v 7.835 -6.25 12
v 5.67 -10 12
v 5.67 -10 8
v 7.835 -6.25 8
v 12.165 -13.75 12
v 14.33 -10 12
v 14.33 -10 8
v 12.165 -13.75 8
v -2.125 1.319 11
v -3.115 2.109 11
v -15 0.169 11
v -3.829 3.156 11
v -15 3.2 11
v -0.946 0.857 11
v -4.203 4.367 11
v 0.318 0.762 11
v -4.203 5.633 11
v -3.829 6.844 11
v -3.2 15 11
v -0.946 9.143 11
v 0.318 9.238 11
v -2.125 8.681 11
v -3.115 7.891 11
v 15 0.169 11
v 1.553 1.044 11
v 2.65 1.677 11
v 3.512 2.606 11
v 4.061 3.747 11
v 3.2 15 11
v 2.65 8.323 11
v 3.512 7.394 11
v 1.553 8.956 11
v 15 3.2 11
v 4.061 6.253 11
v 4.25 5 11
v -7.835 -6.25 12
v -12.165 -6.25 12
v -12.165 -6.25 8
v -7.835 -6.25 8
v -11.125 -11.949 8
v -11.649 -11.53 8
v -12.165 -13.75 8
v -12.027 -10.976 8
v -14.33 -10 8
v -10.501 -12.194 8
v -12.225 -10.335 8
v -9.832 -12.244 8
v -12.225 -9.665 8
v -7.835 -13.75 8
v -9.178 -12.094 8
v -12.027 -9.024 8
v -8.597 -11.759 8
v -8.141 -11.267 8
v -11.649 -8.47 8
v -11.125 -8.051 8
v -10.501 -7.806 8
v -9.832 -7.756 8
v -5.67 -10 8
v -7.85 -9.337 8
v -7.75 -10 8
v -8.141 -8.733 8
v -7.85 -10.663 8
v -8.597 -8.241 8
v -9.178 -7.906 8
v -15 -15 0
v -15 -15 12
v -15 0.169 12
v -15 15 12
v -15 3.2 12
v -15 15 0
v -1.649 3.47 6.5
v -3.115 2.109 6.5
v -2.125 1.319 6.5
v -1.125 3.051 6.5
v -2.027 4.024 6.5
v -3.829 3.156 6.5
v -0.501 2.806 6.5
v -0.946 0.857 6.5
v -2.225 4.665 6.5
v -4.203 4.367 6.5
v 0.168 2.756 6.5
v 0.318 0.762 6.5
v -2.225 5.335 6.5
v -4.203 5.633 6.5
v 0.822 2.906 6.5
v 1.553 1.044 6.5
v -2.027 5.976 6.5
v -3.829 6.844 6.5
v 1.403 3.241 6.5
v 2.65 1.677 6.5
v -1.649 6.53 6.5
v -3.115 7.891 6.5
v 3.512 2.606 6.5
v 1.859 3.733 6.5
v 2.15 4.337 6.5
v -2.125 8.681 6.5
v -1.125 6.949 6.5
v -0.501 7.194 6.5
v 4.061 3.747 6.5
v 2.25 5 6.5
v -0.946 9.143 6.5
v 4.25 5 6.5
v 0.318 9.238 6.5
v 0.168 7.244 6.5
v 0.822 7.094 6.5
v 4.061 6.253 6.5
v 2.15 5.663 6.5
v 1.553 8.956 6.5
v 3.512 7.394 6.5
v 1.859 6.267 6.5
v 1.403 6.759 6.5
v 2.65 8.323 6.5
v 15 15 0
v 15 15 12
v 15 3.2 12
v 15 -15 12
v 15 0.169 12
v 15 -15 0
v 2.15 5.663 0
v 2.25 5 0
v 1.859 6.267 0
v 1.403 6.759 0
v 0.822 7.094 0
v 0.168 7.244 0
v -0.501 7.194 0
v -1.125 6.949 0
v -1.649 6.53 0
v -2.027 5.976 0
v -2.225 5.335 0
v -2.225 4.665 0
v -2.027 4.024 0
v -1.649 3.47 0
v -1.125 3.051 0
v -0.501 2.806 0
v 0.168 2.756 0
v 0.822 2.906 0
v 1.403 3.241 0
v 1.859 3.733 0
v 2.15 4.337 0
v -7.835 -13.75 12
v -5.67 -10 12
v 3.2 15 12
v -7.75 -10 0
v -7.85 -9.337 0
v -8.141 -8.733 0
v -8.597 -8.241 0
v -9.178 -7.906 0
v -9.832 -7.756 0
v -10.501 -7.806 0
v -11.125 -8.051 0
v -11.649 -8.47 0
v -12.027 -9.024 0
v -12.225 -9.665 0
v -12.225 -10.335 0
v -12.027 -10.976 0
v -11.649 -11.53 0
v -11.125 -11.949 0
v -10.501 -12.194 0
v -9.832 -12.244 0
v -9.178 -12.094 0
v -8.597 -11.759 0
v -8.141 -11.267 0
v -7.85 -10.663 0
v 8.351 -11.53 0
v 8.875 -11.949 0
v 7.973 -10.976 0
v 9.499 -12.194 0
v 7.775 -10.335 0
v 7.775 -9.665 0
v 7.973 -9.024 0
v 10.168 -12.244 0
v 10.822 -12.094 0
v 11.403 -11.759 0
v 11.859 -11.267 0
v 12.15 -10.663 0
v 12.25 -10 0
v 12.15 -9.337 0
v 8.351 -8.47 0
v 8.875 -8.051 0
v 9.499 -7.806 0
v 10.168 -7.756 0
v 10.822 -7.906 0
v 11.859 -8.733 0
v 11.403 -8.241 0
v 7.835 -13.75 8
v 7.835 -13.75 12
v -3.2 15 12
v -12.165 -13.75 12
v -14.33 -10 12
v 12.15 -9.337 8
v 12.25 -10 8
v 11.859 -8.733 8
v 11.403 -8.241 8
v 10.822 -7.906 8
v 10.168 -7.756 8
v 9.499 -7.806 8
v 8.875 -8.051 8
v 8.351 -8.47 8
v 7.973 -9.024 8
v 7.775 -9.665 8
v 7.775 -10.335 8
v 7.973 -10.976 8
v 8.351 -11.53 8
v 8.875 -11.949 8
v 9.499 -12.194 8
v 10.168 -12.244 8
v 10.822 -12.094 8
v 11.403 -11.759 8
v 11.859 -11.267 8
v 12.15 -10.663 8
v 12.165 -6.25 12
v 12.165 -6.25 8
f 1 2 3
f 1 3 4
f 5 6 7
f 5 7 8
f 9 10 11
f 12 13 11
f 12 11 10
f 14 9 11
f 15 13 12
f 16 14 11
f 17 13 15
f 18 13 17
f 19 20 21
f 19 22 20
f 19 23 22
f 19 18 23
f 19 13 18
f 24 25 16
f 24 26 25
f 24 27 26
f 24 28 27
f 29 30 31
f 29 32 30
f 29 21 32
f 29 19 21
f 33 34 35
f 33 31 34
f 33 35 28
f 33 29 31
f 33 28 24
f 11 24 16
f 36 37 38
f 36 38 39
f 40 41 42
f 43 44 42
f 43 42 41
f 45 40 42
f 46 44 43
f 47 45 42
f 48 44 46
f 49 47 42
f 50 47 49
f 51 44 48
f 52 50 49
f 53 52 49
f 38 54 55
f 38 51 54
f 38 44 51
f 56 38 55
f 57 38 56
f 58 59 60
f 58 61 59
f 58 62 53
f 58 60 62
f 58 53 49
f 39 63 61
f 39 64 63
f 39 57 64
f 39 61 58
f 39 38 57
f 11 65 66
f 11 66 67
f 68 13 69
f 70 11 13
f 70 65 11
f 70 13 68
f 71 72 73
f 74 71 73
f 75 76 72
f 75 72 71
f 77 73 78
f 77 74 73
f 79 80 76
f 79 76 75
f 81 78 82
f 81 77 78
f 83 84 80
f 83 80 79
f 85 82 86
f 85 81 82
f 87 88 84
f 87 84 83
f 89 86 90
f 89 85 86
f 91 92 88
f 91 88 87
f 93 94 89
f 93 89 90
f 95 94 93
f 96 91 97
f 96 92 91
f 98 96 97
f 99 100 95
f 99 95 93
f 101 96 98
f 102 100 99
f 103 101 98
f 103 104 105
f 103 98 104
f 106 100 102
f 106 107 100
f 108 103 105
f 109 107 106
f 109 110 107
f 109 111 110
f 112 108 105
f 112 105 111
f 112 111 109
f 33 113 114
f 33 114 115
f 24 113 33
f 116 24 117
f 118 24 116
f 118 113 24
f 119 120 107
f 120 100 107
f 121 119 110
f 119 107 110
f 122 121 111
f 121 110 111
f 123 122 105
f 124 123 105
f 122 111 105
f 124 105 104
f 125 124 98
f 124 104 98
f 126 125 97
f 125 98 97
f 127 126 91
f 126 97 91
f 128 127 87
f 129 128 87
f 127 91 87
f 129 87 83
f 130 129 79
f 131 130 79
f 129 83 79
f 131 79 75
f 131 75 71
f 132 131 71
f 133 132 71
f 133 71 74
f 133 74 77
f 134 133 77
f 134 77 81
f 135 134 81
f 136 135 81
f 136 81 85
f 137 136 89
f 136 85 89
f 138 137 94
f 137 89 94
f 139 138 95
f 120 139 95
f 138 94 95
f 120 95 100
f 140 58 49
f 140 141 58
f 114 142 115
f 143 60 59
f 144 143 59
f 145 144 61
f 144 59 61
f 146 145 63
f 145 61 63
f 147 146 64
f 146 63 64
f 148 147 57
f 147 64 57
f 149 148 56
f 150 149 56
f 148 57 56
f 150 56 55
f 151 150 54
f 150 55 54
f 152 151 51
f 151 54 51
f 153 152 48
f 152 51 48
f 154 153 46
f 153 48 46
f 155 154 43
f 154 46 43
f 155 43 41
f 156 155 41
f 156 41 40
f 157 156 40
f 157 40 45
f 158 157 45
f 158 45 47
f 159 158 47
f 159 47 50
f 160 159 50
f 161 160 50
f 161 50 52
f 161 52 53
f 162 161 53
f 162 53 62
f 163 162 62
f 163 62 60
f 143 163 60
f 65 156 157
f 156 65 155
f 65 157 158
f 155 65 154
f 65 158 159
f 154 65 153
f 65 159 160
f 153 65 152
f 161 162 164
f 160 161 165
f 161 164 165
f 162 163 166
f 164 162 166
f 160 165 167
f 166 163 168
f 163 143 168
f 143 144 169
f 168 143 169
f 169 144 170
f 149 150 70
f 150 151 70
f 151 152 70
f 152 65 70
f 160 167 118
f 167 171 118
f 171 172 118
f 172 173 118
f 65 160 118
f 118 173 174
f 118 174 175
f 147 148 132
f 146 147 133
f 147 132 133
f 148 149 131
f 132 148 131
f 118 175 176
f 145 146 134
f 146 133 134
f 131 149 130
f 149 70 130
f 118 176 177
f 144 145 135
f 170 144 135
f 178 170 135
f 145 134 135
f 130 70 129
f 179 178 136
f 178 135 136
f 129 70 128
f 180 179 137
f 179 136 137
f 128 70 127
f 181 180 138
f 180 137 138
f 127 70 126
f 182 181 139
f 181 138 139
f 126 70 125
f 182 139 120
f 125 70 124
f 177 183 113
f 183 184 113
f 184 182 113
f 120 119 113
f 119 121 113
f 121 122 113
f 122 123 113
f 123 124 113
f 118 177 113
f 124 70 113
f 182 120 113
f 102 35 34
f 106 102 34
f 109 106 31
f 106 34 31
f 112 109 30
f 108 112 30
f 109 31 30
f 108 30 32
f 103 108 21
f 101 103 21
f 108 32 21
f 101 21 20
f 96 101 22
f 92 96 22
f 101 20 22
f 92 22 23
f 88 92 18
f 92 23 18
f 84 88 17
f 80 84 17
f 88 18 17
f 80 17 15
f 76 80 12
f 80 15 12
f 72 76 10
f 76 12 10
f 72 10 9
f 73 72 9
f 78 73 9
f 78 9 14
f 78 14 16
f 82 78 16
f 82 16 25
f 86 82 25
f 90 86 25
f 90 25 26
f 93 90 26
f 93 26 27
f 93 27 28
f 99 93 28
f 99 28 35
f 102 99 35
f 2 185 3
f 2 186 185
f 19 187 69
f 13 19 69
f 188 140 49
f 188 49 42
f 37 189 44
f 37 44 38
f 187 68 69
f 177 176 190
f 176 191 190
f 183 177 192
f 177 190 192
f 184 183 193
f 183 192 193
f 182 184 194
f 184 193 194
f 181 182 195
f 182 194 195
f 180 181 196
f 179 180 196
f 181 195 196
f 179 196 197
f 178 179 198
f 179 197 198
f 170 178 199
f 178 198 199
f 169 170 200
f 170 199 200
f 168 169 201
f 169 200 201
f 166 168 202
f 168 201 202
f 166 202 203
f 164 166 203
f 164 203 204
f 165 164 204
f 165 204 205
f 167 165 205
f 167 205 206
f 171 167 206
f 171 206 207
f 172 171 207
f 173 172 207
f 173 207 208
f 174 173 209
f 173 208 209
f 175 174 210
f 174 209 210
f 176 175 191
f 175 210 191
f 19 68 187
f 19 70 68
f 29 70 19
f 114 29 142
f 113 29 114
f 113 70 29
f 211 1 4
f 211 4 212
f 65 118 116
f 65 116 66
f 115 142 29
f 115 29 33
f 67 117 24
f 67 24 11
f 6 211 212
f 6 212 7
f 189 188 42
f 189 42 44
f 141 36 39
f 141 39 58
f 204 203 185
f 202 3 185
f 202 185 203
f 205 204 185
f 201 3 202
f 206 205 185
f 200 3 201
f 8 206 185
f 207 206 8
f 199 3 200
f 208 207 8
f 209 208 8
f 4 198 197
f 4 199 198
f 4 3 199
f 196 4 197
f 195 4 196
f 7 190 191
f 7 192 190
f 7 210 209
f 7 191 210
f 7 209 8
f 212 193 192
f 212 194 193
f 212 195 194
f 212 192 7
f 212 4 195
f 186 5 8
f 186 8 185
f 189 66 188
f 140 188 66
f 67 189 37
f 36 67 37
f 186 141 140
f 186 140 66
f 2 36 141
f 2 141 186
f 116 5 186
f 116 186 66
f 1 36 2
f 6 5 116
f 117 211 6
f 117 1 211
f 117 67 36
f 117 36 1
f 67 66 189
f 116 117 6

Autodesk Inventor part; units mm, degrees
ref_plane "YZ Plane" through (0, 0, 0) normal (1, 0, 0) x (0, 1, 0)
ref_plane "XZ Plane" through (0, 0, 0) normal (0, 1, 0) x (-1, 0, 0)
ref_plane "XY Plane" through (0, 0, 0) normal (0, 0, 1) x (1, 0, 0)
sketch "Sketch1" plane through (0, 0, 0) normal (0, 0, 1) x (1, 0, 0)
  line L0 (-15, 15) -> (15, 15)
  line L1 (15, 15) -> (15, -15)
  line L2 (15, -15) -> (-15, -15)
  line L3 (-15, -15) -> (-15, 15)
  point P0 (0, 0)
  dimension "d0" = 30
  dimension "d1" = 30
  dimension "d2" = 15
  dimension "d3" = 15
extrude "Extrusion1" add sketch "Sketch1" along normal blind 12
sketch "Sketch2" plane through (0, 0, 12) normal (0, 0, 1) x (1, 0, 0)
  circle A0 centre (0, 5) radius 2.25
  line L0 (15, 15) -> (-15, 15) projected
  dimension "d34" = 4.5
  dimension "d35" = 10
extrude "Extrusion2" cut sketch "Sketch2" against normal blind 12
sketch "Sketch3" plane through (0, 0, 12) normal (0, 0, 1) x (1, 0, 0)
  circle A0 centre (0, 5) radius 4.25
  line L0 (15, 15) -> (-15, 15) projected
  dimension "d32" = 8.5
  dimension "d33" = 10
extrude "Extrusion3" cut sketch "Sketch3" against normal blind 5.5
sketch "Sketch4" plane through (0, 0, 12) normal (0, 0, 1) x (1, 0, 0)
  line L0 (0, 0) -> (0, 18.2)
  line L1 (0, 18.2) -> (-18.0312, 0.1688)
  line L2 (0, 18.2) -> (18.0312, 0.1688)
  line L3 (0, 18.2) -> (25.5, 18.2) construction
  line L4 (18.0312, 0.1688) -> (-18.0312, 0.1688)
  dimension "d12" = 18.2
  dimension "d13" = 25.5
  dimension "d14" = 45
  dimension "d26" = 25.5
  dimension "d27" = 45
extrude "Extrusion4" cut sketch "Sketch4" against normal blind 1
sketch "Sketch5" plane through (0, 0, 12) normal (0, 0, 1) x (1, 0, 0)
  circle A0 centre (10, -10) radius 2.25
  line L0 (-15, -15) -> (15, -15) projected
  line L1 (15, -15) -> (15, 15) projected
  circle A1 centre (-10, -10) radius 2.25
  line L2 (-15, 0.1688) -> (-15, -15) projected
  point P0 (0, 0)
  point P1 (15, 0.3223)
  point P2 (-15, 0.3223)
  dimension "d18" = 4.5
  dimension "d19" = 5
  dimension "d20" = 5
  dimension "d21" = 4.5
  dimension "d22" = 5
  dimension "d23" = 5
extrude "Extrusion5" cut sketch "Sketch5" against normal blind 12
sketch "Sketch6" plane through (0, 0, 12) normal (0, 0, 1) x (1, 0, 0)
  circle A0 centre (-10, -10) radius 2.25 projected
  line L0 (-12.1651, -13.75) -> (-14.3301, -10)
  line L1 (-14.3301, -10) -> (-12.1651, -6.25)
  line L2 (-12.1651, -6.25) -> (-7.8349, -6.25)
  line L3 (-7.8349, -6.25) -> (-5.6699, -10)
  line L4 (-5.6699, -10) -> (-7.8349, -13.75)
  line L5 (-7.8349, -13.75) -> (-12.1651, -13.75)
  circle A1 centre (10, -10) radius 2.25 projected
  line L6 (7.8349, -13.75) -> (5.6699, -10)
  line L7 (5.6699, -10) -> (7.8349, -6.25)
  line L8 (7.8349, -6.25) -> (12.1651, -6.25)
  line L9 (12.1651, -6.25) -> (14.3301, -10)
  line L10 (14.3301, -10) -> (12.1651, -13.75)
  line L11 (12.1651, -13.75) -> (7.8349, -13.75)
  point P0 (0, 0)
  dimension "d28" = 7.5
  dimension "d29" = 7.5
extrude "Extrusion6" cut sketch "Sketch6" against normal blind 4
properties part number "210505 - Prism adapter v3"
